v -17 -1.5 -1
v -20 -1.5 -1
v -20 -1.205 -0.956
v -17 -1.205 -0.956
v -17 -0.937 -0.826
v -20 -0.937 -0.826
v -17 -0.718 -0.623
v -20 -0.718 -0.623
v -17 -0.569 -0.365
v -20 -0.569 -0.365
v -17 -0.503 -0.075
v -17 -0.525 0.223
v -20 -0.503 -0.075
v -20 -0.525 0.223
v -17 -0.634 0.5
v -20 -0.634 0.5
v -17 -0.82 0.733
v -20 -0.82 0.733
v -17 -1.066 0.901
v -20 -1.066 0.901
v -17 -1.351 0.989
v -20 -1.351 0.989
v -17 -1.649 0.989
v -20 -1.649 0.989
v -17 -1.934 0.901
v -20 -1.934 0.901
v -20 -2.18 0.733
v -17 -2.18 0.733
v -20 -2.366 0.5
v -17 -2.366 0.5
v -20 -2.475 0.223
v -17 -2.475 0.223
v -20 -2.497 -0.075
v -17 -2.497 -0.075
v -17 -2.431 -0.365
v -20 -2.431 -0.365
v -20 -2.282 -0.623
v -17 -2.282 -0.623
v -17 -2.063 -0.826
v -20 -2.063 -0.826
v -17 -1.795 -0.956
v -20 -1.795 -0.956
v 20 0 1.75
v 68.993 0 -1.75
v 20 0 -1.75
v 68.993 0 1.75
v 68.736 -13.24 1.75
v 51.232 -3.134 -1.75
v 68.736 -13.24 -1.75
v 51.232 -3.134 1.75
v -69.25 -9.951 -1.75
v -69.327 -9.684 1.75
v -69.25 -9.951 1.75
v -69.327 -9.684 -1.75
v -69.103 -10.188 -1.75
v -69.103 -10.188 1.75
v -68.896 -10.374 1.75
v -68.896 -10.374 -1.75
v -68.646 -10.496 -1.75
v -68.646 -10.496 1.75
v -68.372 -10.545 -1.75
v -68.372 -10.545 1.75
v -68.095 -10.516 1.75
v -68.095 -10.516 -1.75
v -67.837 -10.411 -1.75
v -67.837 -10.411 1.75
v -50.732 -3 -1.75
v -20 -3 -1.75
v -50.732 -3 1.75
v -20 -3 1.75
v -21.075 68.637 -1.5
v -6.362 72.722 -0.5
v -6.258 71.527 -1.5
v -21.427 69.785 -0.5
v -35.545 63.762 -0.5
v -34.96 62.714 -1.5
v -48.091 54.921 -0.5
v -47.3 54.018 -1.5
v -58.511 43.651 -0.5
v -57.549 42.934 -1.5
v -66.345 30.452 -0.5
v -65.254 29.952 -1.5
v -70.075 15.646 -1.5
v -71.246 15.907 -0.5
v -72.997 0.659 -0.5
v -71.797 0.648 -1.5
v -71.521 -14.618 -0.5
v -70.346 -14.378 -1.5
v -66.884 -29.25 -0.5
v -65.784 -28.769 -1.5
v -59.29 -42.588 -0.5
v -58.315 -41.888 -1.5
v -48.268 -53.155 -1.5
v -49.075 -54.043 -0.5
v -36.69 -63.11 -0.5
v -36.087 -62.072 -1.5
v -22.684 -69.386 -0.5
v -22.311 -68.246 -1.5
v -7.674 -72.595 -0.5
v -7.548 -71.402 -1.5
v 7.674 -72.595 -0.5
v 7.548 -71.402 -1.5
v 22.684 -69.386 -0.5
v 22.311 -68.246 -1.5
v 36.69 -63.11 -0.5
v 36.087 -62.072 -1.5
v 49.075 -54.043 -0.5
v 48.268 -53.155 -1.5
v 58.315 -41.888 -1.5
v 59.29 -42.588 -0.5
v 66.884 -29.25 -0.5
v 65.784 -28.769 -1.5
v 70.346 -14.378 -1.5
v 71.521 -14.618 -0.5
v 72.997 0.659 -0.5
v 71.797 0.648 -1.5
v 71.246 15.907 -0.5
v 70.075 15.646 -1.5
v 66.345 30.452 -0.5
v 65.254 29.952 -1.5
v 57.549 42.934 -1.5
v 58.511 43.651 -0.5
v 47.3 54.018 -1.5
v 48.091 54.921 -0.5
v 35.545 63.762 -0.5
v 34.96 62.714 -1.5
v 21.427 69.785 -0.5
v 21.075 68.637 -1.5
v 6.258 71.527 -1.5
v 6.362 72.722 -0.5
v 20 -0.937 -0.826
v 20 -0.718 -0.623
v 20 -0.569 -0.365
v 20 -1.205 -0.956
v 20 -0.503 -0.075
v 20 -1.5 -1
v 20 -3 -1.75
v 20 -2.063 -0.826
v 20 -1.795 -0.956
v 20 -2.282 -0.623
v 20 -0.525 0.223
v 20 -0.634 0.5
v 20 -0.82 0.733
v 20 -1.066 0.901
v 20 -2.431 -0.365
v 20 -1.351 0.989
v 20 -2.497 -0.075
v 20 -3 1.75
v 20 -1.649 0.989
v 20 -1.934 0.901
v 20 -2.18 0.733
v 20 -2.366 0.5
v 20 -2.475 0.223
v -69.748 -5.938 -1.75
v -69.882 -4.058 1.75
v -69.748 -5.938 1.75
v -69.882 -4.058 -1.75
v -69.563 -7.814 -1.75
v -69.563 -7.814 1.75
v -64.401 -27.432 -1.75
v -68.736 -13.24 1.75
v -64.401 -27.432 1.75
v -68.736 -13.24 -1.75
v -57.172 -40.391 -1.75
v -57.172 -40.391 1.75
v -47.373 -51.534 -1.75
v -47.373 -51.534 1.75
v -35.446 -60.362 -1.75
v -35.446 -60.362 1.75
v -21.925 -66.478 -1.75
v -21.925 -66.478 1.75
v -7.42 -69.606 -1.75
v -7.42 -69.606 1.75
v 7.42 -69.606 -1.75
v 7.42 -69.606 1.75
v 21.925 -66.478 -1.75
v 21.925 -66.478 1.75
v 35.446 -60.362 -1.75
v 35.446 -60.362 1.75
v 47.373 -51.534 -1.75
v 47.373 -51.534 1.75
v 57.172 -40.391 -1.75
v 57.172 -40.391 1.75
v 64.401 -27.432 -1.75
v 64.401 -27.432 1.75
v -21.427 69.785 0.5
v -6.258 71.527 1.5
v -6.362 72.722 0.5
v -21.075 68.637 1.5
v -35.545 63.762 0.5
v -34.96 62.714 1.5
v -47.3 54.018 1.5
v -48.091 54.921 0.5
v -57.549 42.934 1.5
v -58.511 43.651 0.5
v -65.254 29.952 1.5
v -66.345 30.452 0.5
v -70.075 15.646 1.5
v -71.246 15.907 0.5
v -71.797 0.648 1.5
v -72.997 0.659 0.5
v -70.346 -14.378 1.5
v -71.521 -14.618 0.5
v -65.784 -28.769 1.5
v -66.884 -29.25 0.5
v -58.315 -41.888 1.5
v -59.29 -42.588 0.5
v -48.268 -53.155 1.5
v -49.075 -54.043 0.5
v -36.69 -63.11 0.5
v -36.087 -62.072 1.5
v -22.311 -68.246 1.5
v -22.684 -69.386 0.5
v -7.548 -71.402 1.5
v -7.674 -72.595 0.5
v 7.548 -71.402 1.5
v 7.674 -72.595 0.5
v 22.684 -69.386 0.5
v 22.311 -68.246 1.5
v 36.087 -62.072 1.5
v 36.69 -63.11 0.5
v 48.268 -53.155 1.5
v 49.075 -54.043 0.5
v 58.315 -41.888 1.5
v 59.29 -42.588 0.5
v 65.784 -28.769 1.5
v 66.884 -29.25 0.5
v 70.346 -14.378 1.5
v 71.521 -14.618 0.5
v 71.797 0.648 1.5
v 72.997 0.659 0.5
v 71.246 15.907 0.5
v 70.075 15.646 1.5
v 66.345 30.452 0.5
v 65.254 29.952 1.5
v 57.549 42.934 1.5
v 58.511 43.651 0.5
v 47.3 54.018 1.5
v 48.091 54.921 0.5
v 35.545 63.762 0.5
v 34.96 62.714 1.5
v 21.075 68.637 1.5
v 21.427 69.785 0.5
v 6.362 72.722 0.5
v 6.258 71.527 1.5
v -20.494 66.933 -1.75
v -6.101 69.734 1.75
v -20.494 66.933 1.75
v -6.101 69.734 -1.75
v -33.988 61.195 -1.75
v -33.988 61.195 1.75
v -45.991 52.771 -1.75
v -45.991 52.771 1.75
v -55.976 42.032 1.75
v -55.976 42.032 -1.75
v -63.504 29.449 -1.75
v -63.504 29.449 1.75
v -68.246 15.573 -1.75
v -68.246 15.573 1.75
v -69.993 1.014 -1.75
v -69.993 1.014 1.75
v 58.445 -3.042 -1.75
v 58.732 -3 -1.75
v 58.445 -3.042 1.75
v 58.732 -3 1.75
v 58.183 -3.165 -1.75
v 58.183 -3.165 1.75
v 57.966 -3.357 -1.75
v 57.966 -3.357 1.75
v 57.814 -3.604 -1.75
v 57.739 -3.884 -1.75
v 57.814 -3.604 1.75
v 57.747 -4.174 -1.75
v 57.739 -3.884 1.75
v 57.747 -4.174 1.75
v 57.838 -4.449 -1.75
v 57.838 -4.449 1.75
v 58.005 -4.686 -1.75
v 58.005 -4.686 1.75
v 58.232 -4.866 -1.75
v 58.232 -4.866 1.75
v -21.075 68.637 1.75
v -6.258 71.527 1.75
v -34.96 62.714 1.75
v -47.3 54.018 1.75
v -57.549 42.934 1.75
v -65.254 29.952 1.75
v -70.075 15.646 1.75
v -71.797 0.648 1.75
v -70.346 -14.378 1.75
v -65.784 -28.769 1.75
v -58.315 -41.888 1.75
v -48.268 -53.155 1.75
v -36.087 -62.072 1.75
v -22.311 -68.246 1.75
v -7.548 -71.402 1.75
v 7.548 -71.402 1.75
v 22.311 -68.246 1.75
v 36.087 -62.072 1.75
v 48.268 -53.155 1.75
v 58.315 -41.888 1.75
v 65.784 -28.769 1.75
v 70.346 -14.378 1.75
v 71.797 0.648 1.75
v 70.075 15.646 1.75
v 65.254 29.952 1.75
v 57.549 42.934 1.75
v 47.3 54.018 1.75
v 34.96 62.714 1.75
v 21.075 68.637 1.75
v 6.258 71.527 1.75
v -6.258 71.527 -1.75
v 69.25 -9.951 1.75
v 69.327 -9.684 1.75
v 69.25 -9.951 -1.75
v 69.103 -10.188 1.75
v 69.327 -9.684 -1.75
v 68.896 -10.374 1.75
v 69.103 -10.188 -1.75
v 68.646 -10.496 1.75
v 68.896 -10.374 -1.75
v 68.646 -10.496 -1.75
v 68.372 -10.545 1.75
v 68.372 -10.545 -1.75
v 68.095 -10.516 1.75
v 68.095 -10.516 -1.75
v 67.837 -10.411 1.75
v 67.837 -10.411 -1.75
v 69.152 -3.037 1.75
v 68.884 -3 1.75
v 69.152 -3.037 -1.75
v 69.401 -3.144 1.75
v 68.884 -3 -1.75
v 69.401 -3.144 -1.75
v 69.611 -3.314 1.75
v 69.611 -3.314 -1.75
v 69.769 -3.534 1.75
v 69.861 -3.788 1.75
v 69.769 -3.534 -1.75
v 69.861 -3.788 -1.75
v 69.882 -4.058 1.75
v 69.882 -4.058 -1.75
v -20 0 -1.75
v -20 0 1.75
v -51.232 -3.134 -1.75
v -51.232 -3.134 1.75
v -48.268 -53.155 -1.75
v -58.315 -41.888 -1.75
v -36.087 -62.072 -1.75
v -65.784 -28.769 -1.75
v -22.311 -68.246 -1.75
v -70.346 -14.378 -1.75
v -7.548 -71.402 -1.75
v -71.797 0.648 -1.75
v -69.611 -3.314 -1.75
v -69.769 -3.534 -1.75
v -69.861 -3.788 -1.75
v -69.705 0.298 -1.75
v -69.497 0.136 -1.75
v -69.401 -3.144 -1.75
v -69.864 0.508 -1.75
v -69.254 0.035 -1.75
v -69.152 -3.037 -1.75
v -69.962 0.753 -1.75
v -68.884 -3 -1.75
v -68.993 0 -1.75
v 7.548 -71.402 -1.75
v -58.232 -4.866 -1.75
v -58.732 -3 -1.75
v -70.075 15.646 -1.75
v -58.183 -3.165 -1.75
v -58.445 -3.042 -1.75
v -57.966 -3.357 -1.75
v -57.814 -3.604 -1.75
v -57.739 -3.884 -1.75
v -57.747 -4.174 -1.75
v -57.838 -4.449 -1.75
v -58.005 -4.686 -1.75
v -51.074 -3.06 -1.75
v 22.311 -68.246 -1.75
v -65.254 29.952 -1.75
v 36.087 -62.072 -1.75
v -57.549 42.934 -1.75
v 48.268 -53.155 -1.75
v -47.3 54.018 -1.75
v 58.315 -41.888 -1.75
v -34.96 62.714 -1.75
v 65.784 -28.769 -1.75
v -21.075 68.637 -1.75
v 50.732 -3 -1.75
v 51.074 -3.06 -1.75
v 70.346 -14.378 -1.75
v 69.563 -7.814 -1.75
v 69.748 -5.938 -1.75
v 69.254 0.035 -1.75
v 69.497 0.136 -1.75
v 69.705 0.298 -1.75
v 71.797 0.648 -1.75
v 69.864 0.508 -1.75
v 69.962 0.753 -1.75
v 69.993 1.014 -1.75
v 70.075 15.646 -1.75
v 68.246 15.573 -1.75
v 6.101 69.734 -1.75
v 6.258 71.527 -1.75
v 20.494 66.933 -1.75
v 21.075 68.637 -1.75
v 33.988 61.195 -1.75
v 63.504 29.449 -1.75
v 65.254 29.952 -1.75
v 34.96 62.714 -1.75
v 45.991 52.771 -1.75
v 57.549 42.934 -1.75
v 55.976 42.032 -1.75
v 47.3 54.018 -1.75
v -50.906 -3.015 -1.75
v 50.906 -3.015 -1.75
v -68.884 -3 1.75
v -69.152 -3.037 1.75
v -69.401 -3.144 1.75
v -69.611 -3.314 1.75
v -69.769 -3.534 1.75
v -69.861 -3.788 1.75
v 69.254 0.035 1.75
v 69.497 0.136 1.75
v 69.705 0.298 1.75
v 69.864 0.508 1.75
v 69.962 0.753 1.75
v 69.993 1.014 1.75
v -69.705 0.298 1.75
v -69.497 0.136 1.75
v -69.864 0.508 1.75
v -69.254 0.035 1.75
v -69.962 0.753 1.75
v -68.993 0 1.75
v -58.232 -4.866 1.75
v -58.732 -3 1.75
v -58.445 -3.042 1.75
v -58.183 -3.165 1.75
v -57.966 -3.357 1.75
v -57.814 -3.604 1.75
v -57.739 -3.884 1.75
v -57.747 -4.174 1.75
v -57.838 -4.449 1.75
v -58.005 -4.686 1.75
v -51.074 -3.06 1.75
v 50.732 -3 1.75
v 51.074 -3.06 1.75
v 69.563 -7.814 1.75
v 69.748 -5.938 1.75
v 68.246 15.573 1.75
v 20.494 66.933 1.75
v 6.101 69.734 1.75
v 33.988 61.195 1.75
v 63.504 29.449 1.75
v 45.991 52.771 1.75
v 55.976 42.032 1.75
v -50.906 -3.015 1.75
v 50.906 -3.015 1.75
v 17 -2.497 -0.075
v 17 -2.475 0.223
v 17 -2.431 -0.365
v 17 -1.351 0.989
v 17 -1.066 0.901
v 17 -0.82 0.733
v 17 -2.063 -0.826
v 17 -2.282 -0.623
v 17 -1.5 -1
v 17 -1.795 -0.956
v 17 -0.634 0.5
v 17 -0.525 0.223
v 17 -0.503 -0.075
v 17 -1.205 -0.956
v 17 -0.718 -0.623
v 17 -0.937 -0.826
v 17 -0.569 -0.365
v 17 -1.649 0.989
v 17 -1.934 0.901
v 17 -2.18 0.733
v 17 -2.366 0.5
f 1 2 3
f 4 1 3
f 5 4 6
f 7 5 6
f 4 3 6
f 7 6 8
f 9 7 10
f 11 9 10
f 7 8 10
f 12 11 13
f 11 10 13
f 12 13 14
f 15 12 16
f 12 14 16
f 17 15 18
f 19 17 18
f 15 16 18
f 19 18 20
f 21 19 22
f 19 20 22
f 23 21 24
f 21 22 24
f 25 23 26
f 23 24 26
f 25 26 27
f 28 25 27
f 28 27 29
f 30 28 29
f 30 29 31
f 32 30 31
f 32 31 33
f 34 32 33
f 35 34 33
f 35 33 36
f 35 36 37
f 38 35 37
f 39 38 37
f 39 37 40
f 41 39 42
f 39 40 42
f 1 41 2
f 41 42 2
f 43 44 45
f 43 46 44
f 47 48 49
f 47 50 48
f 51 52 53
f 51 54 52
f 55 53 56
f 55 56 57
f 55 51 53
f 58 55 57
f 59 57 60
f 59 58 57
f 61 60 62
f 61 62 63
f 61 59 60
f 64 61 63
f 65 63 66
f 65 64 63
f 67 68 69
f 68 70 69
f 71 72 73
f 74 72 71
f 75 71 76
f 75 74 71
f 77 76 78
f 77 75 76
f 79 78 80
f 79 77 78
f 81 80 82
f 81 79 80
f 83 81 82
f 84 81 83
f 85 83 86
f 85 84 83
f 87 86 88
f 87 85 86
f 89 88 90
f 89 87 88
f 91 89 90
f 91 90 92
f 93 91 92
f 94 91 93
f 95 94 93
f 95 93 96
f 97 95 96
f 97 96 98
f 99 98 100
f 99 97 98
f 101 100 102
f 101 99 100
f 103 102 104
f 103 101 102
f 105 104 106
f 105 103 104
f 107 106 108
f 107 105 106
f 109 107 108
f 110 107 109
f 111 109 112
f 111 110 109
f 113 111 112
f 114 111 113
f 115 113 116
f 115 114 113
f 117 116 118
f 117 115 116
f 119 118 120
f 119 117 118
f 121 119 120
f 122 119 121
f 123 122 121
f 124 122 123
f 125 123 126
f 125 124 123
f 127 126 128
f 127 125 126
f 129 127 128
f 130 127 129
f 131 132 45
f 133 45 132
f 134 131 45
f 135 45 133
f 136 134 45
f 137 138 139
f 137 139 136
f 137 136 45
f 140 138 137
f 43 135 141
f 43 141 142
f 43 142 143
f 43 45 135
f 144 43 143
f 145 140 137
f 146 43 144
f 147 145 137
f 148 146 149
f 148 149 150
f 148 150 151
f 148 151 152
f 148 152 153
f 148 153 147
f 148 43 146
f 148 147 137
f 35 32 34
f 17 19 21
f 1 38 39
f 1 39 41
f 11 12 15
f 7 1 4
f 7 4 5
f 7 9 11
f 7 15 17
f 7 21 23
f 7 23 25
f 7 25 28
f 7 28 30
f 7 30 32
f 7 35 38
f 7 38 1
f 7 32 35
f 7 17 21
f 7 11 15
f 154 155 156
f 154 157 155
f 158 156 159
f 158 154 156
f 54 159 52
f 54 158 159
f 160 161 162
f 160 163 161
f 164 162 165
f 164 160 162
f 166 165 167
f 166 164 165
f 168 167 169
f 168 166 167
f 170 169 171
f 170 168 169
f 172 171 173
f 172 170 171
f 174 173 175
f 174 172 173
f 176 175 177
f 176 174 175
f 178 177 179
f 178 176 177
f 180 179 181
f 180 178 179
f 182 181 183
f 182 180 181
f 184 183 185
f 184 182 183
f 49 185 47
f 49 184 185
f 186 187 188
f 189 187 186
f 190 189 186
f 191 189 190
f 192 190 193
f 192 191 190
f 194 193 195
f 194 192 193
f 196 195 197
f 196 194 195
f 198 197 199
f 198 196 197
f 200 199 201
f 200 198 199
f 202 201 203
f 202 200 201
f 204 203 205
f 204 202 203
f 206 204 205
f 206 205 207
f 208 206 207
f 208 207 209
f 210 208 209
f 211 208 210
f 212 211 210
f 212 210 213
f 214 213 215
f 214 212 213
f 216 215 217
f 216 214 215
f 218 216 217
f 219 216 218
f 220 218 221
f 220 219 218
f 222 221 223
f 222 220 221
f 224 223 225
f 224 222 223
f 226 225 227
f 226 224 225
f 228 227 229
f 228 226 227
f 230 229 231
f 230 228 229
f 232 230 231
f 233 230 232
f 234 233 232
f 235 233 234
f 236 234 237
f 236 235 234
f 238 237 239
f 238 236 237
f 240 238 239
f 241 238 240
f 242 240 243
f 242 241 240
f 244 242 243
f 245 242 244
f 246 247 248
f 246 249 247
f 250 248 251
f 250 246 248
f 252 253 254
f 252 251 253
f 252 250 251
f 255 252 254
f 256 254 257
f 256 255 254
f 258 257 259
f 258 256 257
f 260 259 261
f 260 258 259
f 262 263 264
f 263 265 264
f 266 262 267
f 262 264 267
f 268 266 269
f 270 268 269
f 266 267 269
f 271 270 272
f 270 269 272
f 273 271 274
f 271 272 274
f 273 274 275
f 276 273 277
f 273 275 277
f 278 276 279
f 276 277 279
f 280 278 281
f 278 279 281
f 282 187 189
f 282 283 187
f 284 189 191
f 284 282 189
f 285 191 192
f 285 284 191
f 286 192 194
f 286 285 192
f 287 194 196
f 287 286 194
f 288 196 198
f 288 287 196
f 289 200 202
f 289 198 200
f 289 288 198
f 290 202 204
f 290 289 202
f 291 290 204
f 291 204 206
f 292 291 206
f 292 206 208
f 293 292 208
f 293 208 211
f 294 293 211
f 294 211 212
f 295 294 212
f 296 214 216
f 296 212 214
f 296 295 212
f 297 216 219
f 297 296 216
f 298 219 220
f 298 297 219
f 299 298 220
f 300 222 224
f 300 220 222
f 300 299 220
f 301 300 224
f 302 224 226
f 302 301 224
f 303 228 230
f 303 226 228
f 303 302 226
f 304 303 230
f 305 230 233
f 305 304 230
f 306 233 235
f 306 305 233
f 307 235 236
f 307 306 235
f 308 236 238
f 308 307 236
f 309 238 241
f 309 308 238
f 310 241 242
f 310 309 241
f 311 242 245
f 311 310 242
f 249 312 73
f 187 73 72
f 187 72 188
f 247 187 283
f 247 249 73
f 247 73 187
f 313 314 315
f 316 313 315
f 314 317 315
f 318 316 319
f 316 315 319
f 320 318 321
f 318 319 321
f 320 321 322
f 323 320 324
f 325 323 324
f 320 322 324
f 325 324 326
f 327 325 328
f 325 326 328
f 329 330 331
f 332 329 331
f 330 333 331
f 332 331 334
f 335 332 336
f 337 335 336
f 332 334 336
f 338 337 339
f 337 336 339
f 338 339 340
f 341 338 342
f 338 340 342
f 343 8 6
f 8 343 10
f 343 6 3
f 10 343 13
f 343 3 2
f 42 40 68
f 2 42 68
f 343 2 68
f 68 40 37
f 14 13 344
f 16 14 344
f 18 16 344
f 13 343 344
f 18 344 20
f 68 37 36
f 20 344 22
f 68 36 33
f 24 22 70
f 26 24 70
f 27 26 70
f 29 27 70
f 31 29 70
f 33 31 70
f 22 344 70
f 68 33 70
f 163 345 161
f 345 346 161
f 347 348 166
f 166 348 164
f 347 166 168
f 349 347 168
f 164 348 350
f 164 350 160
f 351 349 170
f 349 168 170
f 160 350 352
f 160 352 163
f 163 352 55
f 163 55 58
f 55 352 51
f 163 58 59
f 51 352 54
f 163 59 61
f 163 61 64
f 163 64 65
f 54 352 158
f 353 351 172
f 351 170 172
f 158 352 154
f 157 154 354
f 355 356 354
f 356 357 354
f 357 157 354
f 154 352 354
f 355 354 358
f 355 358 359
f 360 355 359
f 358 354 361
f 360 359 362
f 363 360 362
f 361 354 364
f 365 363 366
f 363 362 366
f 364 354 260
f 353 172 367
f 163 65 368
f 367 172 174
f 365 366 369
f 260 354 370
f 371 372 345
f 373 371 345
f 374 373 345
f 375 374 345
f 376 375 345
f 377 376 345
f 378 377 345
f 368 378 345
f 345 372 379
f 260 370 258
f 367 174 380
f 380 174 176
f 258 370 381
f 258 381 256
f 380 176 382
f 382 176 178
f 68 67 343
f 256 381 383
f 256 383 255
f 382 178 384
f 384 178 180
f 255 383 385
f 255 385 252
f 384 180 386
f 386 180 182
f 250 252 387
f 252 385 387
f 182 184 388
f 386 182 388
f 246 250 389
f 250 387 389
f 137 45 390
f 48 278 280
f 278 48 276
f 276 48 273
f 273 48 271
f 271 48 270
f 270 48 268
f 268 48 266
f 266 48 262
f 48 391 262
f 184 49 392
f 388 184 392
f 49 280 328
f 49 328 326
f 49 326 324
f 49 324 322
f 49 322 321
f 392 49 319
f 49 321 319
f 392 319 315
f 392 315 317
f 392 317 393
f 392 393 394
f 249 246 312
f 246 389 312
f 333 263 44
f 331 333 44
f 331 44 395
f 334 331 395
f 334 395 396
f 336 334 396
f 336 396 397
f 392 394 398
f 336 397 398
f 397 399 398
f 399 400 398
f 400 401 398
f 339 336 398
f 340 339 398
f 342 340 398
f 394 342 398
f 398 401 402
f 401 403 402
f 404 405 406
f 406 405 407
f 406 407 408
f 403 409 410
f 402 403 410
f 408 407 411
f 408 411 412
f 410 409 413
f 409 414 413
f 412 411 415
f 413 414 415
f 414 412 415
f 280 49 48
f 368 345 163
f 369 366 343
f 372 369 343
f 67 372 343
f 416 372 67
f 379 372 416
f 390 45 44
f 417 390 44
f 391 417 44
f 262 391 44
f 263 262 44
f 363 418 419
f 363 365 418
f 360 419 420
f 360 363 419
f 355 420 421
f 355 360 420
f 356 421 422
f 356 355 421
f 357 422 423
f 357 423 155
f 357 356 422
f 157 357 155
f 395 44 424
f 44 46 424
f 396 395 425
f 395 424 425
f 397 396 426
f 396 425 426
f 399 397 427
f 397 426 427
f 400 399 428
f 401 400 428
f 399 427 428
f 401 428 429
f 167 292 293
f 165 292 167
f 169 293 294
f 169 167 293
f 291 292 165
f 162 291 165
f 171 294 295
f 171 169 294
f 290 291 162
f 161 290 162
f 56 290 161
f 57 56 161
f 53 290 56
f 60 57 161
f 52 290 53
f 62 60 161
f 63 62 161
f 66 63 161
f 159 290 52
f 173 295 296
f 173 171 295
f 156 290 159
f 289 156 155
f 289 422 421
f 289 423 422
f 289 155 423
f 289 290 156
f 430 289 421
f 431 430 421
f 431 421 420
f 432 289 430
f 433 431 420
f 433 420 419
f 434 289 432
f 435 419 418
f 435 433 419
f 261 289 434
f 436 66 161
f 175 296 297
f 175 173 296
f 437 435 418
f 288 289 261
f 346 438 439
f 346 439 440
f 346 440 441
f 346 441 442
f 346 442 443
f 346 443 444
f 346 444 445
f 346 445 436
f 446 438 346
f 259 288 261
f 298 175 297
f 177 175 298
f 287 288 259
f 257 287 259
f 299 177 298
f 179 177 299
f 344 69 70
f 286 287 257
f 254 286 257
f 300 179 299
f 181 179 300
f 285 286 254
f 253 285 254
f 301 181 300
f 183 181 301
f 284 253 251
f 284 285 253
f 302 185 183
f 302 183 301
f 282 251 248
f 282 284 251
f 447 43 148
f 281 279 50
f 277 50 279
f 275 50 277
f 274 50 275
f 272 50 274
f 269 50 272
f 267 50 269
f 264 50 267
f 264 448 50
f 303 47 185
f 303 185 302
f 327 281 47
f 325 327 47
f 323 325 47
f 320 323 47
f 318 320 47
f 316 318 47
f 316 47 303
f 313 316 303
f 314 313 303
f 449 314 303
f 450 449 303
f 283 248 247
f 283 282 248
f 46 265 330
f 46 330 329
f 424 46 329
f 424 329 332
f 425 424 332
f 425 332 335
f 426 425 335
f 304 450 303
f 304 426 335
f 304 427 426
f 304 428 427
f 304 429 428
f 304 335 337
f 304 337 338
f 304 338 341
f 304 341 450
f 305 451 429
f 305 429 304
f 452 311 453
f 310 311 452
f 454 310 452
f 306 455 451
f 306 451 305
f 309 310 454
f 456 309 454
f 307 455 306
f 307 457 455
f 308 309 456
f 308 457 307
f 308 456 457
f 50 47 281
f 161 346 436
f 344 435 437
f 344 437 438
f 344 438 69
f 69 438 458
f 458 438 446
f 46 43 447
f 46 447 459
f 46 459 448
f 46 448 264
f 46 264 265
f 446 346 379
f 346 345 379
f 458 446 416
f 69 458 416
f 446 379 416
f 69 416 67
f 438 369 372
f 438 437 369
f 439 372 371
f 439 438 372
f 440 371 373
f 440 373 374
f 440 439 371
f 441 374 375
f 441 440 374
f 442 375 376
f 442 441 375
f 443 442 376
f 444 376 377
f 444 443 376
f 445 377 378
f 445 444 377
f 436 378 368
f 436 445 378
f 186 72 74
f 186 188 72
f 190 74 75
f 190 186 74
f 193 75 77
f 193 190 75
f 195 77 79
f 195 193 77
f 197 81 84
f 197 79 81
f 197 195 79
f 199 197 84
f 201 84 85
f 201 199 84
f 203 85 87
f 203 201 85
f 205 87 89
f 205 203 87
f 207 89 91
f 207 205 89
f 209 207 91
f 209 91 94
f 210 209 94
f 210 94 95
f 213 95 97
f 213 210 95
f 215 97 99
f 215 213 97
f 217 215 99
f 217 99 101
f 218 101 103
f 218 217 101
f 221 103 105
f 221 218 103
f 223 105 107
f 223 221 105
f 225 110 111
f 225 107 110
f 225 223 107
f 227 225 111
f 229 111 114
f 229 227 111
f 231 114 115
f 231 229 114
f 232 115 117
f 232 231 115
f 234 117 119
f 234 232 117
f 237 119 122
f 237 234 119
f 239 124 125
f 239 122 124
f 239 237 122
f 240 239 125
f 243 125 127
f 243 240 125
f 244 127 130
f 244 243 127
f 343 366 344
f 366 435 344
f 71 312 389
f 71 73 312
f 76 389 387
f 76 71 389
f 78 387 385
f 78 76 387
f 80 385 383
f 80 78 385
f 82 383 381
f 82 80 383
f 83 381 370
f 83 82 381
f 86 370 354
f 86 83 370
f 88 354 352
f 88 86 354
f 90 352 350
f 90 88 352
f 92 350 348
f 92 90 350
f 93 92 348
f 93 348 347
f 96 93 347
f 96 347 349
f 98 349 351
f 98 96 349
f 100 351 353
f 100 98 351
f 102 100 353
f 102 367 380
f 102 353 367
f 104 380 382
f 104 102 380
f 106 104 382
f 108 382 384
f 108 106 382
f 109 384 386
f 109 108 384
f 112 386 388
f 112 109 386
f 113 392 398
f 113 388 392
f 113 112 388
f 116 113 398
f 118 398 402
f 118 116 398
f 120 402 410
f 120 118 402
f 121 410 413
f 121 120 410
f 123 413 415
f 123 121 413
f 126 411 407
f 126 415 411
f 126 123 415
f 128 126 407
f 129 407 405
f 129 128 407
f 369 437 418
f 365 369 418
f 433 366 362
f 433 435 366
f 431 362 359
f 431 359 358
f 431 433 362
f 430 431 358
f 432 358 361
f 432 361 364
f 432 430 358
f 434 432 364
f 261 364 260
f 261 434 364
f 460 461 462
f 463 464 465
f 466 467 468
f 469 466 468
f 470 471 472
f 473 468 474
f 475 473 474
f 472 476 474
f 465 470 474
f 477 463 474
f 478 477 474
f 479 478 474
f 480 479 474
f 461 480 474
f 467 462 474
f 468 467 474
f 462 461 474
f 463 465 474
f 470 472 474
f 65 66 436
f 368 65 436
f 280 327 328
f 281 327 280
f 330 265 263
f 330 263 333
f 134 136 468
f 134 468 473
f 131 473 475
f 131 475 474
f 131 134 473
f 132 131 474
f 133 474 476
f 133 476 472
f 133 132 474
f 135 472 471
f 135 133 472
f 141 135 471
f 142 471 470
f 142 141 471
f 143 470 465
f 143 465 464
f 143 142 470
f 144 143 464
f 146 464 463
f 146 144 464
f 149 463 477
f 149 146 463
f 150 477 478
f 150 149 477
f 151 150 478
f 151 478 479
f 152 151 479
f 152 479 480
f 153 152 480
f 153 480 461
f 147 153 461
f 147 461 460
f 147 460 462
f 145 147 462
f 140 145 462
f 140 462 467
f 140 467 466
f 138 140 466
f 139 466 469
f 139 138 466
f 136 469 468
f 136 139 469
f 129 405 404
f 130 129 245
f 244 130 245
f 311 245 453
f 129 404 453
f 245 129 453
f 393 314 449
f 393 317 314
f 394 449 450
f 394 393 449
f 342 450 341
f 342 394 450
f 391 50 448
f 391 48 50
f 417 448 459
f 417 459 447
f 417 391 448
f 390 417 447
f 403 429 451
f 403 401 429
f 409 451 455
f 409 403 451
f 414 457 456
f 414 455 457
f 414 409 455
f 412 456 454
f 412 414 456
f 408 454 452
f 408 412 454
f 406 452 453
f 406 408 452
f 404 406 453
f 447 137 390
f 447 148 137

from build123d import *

# Parameters (mm, degrees)
REVOLVE1_ANGLE           = 175
REVOLVE1_OTHER_WAY_ANGLE = 175
BOSS_EXTRUDE1_DEPTH      = 1.75
SKETCH5_R                = 1
BOSS_EXTRUDE2_DEPTH      = 3
FILLET1_R                = 1
FILLET1_OF_MIRROR1_R     = 1


with BuildPart() as part:
    # Sketch2 → Revolve1 (revolve)
    with BuildSketch(Plane(origin=(0, 0, 0), x_dir=(0, 0, -1), z_dir=(1, 0, 0))):
        Polygon((1.75, -70), (1.75, -71.8), (1.5, -71.8), (0.5, -73), (-0.5, -73), (-1.5, -71.8), (-1.75, -71.8), (-1.75, -70), align=None)
    revolve(axis=Axis((0, 0, 0), (0, 0, -1)), revolution_arc=REVOLVE1_ANGLE)

    # Sketch2 → Revolve1 other way (revolve)
    with BuildSketch(Plane(origin=(0, 0, 0), x_dir=(0, 0, -1), z_dir=(1, 0, 0))):
        Polygon((1.75, -70), (1.75, -71.8), (1.5, -71.8), (0.5, -73), (-0.5, -73), (-1.5, -71.8), (-1.75, -71.8), (-1.75, -70), align=None)
    revolve(axis=Axis((0, 0, 0), (0, 0, 1)), revolution_arc=REVOLVE1_OTHER_WAY_ANGLE)

    # Sketch3 → Boss-Extrude1 (add, symmetric)
    with BuildSketch(Plane.XY):
        Polygon((-70, 0), (-20, 0), (-20, -3), (-51, -3), (-68.736443607, -13.240140491), (-69.736443607, -11.508089684), (-55, -3), (-70, -3), align=None)
    boss_extrude1 = extrude(amount=BOSS_EXTRUDE1_DEPTH, both=True)

    # Sketch5 → Boss-Extrude2 (add)
    with BuildSketch(Plane(origin=(-20, 0, 0), x_dir=(0, 0, -1), z_dir=(1, 0, 0))):
        with Locations((0, -1.5)):
            Circle(SKETCH5_R)
    boss_extrude2 = extrude(amount=BOSS_EXTRUDE2_DEPTH)

    # Fillet1
    fillet1_edges = [part.edges().sort_by_distance(p)[0] for p in [
        (-69.93568474, -3, 0),
        (-69.107123463, -11.144751529, 0),
        (-70, 0, 0),
        (-55, -3, 0),
        (-51, -3, 0),
    ]]
    fillet(fillet1_edges, radius=FILLET1_R)

    # Mirror1: Boss-Extrude1, Boss-Extrude2 across plane
    add(boss_extrude1.mirror(Plane(origin=(0, 0, 0), x_dir=(0, 0, 1), z_dir=(1, 0, 0))))
    add(boss_extrude2.mirror(Plane(origin=(0, 0, 0), x_dir=(0, 0, 1), z_dir=(1, 0, 0))))

    # Fillet1 of Mirror1
    fillet1_of_mirror1_edges = [part.edges().sort_by_distance(p)[0] for p in [
        (69.93568474, -3, 0),
        (69.107123463, -11.144751529, 0),
        (70, 0, 0),
        (55, -3, 0),
        (51, -3, 0),
    ]]
    fillet(fillet1_of_mirror1_edges, radius=FILLET1_OF_MIRROR1_R)


solid = part.part
